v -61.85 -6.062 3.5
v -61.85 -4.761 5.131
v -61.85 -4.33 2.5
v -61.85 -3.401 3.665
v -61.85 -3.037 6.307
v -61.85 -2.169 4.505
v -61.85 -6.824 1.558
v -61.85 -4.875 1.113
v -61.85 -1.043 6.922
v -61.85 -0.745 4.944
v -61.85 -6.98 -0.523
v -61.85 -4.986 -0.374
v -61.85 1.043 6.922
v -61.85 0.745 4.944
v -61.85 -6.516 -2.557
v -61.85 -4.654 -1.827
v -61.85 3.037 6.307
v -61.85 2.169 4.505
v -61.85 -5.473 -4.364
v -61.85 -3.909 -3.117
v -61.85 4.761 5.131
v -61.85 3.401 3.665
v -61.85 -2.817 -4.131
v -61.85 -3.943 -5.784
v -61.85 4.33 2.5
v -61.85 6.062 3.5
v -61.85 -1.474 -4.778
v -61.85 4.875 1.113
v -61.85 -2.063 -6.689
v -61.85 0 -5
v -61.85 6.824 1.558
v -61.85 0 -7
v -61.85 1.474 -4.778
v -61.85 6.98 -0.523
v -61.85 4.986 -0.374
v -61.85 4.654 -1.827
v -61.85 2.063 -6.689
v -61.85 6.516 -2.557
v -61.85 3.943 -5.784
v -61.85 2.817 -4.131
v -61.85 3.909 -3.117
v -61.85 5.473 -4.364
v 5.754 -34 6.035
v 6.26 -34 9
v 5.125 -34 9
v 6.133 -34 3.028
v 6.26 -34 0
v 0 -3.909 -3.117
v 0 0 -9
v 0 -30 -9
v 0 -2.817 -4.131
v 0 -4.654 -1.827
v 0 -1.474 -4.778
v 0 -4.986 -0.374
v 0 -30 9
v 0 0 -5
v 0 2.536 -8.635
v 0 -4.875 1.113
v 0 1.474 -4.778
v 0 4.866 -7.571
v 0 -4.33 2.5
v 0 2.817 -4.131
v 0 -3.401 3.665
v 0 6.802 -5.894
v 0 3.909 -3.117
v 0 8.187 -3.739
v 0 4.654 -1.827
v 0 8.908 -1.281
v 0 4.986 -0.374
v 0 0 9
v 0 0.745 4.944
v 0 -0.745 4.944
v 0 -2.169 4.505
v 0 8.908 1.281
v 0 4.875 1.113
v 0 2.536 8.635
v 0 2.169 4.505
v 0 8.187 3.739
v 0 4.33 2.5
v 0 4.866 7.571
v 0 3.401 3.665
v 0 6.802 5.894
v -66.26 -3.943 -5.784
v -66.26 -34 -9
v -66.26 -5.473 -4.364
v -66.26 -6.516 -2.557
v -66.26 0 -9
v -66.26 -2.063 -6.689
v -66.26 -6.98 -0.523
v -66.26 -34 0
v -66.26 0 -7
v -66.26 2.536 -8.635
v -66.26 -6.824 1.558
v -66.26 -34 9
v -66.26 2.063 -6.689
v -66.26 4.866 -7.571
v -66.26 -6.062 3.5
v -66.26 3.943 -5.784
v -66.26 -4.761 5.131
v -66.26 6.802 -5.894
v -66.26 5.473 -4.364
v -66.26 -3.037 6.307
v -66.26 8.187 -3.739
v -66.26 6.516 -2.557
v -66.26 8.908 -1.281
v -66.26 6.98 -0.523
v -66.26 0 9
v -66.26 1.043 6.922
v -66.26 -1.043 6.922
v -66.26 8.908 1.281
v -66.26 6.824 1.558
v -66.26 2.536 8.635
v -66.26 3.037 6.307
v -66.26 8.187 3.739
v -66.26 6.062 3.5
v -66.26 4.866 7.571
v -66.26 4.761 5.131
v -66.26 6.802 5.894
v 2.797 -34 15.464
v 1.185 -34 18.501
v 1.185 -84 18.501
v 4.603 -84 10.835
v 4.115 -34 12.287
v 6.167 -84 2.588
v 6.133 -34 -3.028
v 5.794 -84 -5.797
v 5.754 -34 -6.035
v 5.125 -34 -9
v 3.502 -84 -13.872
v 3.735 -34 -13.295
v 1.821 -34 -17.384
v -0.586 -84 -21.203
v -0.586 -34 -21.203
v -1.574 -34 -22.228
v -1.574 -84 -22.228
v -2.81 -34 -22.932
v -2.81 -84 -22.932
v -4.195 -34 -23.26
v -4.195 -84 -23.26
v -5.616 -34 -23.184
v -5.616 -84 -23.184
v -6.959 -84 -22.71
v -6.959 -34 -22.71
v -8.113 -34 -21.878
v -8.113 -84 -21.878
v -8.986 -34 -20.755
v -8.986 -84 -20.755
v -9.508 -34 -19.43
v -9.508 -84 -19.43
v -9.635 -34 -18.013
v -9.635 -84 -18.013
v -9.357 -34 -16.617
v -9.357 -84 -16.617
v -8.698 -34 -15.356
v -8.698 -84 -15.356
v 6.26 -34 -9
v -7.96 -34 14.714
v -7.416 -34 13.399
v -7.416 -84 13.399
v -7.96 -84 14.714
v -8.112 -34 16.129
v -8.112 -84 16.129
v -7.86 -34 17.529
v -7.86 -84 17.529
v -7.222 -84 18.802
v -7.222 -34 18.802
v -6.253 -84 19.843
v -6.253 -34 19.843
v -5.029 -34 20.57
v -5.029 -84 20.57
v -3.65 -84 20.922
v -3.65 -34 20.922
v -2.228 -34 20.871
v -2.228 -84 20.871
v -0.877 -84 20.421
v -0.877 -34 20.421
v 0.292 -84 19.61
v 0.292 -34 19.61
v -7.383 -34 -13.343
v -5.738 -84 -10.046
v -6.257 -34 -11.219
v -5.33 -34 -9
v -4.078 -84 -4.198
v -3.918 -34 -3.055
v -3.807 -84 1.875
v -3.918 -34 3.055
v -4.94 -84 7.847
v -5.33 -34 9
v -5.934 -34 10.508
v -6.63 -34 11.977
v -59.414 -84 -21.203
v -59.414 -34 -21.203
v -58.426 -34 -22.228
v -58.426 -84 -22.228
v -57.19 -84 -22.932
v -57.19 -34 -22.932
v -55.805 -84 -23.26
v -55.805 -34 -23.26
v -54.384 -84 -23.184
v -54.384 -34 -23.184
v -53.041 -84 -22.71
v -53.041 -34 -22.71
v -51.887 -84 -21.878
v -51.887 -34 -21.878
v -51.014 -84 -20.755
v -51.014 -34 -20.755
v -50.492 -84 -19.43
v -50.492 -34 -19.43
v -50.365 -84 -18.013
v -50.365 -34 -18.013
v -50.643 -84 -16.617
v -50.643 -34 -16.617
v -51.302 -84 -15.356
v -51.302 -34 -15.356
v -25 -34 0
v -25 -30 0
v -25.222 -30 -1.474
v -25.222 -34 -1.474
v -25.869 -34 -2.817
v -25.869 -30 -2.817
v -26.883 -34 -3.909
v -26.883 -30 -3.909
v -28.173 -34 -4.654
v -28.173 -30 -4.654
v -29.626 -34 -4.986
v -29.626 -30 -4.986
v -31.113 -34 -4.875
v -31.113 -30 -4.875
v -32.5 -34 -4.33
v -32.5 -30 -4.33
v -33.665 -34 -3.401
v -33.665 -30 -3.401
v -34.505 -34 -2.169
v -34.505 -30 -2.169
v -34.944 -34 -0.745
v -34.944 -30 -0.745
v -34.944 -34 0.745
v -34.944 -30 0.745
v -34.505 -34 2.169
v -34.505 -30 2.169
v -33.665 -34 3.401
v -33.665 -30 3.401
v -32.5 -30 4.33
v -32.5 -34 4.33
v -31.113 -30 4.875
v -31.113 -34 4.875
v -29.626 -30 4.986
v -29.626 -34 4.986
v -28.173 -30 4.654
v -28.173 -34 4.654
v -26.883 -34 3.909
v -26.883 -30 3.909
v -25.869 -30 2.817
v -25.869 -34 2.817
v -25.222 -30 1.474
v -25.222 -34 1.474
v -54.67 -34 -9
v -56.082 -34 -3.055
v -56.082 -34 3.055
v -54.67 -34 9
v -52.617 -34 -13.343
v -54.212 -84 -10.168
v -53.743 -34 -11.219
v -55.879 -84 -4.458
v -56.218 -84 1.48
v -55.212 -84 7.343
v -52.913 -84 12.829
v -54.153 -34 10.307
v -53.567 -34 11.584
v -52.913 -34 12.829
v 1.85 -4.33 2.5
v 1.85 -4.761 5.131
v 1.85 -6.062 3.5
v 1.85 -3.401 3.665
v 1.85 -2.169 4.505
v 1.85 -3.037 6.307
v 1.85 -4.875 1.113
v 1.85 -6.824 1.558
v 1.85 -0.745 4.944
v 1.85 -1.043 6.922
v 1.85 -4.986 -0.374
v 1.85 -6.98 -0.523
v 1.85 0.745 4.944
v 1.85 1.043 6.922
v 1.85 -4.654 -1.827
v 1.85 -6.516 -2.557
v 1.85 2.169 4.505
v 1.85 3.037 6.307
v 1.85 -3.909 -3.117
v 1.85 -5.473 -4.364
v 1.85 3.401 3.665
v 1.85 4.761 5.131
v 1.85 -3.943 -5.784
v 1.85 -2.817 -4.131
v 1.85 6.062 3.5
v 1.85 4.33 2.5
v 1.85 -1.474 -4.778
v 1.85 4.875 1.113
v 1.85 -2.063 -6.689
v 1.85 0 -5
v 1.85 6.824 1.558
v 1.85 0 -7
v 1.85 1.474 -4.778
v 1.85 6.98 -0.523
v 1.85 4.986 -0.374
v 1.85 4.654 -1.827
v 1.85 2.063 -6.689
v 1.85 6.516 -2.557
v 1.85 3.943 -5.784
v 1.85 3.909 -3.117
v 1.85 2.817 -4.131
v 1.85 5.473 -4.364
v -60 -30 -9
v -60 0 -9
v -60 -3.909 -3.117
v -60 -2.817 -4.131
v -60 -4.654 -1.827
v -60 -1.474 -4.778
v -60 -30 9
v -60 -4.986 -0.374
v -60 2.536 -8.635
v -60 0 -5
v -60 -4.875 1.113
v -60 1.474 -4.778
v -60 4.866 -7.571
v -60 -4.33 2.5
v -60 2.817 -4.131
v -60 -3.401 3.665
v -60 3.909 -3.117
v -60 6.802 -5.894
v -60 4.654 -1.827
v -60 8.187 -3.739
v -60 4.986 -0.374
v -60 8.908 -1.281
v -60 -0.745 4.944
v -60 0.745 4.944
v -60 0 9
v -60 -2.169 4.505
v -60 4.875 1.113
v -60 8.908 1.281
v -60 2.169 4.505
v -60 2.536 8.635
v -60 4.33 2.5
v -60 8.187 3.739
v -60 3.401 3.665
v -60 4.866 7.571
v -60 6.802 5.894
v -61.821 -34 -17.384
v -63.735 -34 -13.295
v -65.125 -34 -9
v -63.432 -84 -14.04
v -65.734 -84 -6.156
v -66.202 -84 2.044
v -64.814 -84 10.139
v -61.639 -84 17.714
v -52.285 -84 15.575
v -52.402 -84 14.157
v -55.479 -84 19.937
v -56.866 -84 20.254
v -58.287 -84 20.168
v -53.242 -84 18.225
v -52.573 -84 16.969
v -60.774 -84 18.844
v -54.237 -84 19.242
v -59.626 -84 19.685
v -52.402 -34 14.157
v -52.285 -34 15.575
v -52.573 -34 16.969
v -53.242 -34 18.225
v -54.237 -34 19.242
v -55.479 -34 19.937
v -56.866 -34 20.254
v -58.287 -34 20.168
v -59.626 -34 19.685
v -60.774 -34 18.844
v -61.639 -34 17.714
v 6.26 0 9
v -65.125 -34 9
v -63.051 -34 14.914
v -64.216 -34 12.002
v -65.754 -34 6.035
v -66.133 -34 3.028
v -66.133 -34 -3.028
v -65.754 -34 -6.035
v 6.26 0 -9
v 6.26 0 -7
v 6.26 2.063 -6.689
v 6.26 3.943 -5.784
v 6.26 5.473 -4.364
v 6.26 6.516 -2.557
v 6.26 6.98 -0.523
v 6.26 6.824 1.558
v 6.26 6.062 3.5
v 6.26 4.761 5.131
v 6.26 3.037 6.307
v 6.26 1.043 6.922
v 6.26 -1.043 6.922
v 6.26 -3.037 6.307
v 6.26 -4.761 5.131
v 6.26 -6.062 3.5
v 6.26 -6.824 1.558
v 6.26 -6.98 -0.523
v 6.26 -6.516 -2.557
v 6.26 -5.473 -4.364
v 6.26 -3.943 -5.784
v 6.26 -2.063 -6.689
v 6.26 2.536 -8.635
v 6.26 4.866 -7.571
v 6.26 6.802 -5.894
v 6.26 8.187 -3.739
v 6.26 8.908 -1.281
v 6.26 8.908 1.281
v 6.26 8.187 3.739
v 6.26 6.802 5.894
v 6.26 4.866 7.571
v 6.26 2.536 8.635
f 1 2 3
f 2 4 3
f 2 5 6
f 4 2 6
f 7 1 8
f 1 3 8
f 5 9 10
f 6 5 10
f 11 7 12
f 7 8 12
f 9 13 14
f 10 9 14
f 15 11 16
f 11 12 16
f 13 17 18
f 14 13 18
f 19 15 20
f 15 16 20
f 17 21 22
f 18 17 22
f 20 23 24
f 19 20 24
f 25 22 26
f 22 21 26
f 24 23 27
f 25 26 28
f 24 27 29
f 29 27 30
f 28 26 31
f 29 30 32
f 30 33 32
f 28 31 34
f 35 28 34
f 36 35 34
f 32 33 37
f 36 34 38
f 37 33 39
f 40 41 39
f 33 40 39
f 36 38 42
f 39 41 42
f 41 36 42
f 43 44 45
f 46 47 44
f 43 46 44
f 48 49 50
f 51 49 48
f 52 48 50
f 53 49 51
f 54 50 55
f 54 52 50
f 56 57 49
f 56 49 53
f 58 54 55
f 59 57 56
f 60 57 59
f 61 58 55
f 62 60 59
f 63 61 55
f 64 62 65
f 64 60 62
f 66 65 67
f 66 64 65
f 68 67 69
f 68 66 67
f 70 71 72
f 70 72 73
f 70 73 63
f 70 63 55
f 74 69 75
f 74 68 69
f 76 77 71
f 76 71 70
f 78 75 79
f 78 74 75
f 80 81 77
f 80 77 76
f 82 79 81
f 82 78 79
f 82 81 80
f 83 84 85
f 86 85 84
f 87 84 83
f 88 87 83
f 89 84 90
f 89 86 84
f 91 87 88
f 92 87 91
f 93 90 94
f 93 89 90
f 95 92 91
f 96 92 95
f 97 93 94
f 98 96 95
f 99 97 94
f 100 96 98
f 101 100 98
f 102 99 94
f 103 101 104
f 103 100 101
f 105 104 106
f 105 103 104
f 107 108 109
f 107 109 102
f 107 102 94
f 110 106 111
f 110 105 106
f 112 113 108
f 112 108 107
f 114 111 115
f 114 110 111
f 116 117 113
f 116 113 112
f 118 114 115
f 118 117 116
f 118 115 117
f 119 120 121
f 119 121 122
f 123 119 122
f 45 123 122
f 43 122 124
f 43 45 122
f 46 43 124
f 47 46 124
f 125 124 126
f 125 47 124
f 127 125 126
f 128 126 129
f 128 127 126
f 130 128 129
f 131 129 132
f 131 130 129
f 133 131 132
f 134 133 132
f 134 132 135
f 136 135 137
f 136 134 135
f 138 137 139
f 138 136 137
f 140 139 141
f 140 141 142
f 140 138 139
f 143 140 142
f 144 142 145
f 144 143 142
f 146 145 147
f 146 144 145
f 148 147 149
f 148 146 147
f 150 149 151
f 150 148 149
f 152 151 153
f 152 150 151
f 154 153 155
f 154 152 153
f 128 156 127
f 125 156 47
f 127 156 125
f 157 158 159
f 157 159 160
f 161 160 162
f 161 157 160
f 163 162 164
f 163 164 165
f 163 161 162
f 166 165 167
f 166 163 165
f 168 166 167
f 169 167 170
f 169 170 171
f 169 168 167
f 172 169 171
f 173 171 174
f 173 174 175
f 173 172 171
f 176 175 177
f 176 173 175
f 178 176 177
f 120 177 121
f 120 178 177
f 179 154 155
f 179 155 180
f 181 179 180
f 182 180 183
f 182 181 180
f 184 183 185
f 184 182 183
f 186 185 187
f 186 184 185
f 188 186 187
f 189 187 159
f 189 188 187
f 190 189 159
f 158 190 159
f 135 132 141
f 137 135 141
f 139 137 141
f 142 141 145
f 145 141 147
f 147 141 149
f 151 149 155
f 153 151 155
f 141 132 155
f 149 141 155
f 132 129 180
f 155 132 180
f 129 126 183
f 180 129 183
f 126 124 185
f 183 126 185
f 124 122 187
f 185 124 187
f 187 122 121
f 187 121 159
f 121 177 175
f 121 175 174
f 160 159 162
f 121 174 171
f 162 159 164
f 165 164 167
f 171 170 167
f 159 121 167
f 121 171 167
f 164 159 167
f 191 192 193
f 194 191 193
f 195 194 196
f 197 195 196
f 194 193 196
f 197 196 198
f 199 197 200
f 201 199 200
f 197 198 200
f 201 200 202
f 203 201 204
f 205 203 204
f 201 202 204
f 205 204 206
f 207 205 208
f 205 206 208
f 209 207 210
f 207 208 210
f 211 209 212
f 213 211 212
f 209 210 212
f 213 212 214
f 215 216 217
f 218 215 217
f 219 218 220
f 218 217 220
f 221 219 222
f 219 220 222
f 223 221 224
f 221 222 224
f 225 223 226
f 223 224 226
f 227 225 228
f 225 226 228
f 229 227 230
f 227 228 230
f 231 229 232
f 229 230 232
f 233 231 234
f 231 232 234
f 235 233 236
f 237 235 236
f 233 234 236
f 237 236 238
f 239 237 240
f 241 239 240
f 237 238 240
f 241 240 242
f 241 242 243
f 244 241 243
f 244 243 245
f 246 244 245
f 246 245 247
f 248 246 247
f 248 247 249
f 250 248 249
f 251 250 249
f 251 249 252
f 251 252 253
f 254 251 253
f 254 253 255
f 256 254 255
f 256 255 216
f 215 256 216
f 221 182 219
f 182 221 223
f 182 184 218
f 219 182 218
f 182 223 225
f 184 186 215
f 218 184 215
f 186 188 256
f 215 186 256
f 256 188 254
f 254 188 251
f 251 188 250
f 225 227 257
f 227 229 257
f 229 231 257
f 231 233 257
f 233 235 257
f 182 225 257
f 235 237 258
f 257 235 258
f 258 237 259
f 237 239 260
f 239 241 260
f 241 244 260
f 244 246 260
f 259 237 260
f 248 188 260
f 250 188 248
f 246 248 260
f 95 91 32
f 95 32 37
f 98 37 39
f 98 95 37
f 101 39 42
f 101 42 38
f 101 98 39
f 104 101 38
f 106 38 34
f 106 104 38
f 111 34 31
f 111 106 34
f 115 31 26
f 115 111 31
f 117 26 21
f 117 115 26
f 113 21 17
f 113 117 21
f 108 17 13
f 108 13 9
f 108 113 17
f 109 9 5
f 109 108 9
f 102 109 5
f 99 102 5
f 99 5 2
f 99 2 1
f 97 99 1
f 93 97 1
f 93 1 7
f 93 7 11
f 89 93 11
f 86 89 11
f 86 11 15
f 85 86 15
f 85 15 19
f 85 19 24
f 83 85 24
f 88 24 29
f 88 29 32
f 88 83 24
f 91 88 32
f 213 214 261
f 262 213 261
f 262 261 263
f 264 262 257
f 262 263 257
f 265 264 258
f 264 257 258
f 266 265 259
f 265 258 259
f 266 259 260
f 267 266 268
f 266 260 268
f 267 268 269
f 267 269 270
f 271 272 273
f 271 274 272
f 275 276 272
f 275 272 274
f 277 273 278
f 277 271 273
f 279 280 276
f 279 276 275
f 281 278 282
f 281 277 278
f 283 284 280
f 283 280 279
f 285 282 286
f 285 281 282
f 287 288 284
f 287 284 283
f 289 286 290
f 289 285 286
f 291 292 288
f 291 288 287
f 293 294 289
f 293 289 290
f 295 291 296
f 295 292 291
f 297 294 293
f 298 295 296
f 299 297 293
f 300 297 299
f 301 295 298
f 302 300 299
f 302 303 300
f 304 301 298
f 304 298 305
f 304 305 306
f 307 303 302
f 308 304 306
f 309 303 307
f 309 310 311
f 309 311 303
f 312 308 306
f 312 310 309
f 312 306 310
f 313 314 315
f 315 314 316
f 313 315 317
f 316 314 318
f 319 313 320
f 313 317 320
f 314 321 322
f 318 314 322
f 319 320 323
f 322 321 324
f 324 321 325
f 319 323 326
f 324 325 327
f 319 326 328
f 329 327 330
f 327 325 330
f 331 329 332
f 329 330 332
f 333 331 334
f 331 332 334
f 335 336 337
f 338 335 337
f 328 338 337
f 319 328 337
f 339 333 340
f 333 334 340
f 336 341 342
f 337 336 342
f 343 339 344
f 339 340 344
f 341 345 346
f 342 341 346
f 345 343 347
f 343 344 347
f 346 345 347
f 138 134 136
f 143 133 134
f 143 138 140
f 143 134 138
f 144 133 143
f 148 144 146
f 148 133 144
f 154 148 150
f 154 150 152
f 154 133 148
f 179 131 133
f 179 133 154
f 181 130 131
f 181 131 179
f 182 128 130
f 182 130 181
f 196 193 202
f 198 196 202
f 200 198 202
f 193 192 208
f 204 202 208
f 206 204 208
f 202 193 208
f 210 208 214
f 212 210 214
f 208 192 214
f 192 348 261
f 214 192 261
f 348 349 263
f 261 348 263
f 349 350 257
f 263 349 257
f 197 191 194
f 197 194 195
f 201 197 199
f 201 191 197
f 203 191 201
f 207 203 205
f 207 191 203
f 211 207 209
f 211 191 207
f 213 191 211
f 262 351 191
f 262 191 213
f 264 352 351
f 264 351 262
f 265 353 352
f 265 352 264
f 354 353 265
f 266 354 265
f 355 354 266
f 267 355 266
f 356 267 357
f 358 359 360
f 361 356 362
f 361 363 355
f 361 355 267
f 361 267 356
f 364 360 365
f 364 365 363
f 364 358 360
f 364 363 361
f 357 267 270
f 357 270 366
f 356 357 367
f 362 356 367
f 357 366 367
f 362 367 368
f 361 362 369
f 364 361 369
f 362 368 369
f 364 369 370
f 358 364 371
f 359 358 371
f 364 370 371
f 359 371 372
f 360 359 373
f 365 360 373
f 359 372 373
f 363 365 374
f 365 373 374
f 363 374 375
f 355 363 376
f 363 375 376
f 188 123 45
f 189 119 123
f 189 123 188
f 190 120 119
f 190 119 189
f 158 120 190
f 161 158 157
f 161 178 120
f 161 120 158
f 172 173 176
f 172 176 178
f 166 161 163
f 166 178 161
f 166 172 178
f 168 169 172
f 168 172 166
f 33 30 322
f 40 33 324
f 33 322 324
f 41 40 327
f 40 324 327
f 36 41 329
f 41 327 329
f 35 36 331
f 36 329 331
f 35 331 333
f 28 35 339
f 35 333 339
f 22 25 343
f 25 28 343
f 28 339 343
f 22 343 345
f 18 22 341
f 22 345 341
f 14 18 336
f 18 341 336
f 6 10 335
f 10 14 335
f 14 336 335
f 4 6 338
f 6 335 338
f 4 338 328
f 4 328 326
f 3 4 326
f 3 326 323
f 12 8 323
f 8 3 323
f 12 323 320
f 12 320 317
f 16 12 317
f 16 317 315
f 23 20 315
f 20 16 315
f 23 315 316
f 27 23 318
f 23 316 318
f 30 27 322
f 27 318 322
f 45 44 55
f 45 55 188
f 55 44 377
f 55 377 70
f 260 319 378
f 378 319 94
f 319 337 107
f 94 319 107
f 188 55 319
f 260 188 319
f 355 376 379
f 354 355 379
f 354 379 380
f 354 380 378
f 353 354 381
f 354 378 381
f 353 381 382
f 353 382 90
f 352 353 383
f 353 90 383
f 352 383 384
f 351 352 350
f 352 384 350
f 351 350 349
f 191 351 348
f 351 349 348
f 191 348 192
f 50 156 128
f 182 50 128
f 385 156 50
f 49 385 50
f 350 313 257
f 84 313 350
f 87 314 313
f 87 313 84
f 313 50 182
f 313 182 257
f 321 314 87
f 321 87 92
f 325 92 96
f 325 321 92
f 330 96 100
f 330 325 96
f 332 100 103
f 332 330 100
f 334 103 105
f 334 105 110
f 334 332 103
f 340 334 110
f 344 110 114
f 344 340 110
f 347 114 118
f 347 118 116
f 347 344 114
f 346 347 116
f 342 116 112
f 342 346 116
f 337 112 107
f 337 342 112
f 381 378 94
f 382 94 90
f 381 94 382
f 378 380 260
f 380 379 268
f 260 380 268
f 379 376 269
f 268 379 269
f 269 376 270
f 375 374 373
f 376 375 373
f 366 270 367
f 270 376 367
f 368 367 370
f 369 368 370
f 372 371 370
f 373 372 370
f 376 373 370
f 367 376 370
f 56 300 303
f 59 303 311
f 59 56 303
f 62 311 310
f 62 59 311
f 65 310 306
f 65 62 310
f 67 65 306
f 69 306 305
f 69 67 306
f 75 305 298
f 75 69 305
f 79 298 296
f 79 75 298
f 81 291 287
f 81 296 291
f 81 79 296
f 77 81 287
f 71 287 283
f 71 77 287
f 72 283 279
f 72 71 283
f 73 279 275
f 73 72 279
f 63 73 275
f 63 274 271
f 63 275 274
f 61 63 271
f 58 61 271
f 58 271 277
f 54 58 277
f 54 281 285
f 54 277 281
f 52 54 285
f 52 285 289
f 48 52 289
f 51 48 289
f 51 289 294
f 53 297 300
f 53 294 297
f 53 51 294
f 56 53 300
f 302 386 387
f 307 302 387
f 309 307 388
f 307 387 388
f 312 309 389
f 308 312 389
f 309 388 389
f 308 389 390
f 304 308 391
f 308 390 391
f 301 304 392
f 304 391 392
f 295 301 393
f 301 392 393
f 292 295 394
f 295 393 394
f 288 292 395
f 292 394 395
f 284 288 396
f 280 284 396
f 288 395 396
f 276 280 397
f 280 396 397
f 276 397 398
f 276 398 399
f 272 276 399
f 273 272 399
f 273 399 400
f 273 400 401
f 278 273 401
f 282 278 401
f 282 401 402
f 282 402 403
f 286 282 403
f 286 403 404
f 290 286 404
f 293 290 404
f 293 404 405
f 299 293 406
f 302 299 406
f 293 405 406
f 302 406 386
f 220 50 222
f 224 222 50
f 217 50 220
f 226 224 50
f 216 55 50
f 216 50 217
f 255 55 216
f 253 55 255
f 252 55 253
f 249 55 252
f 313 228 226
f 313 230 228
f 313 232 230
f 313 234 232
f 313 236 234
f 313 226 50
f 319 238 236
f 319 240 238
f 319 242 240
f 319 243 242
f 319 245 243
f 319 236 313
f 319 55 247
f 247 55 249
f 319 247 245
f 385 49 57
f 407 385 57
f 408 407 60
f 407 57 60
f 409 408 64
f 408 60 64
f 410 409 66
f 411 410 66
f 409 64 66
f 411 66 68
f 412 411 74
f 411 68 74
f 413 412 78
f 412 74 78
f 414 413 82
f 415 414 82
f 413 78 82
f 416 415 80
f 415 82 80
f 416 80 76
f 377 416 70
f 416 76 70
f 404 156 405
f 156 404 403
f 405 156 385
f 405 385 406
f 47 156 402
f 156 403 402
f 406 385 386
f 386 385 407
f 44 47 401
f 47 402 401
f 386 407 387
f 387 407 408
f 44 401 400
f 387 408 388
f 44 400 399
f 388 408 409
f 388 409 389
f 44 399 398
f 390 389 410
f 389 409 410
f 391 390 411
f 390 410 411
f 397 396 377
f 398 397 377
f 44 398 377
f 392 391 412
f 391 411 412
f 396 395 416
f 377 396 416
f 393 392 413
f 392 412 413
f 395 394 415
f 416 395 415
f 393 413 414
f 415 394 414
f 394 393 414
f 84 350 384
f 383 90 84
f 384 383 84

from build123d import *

# Parameters (mm, degrees)
SKETCH1_R           = 9
SKETCH1_R_2         = 5
BOSS_EXTRUDE1_DEPTH = 6.26
BOSS_EXTRUDE2_DEPTH = 6.26
SKETCH2_R           = 7
CUT_EXTRUDE1_DEPTH  = 4.41
SKETCH4_W           = 36.26
SKETCH4_H           = 18
BOSS_EXTRUDE3_DEPTH = 4
SKETCH5_R           = 5
CUT_EXTRUDE2_DEPTH  = 5
BOSS_EXTRUDE4_DEPTH = 50


with BuildPart() as part:
    # Sketch1 → Boss-Extrude1 (new body)
    with BuildSketch(Plane(origin=(0, 0, 0), x_dir=(0, 0, -1), z_dir=(1, 0, 0))):
        Circle(SKETCH1_R)
        Circle(SKETCH1_R_2, mode=Mode.SUBTRACT)
    extrude(amount=BOSS_EXTRUDE1_DEPTH)

    # Sketch3 → Boss-Extrude2 (add)
    with BuildSketch(Plane.ZY):
        with BuildLine():
            Line((-9, 0), (-9, -30))
            Line((-9, -30), (9, -30))
            Line((9, -30), (9, 0))
            Line((9, 0), (5, 0))
            ThreePointArc((5, 0), (0, -5), (-5, 0))
            Line((-5, 0), (-9, 0))
        make_face()
    extrude(amount=-BOSS_EXTRUDE2_DEPTH)

    # Sketch2 → Cut-Extrude1 (cut)
    with BuildSketch(Plane(origin=(6.26, 0, 0), x_dir=(0, 0, -1), z_dir=(1, 0, 0))):
        Circle(SKETCH2_R)
    extrude(amount=-CUT_EXTRUDE1_DEPTH, mode=Mode.SUBTRACT)

    # Sketch4 → Boss-Extrude3 (add)
    with BuildSketch(Plane.XZ.offset(30)):
        with Locations((-11.87, 0)):
            Rectangle(SKETCH4_W, SKETCH4_H)
    extrude(amount=BOSS_EXTRUDE3_DEPTH)

    # Mirror2: part across plane


with BuildPart() as part_1:
    add(part.part)
    add(part.part.mirror(Plane(origin=(-30, -34, 9), x_dir=(0, 0, 1), z_dir=(1, 0, 0))))

    # Sketch5 → Cut-Extrude2 (cut, through all)
    with BuildSketch(Plane(origin=(0, -30, 0), x_dir=(1, 0, 0), z_dir=(0, 1, 0))):
        with Locations((-30, 0)):
            Circle(SKETCH5_R)
    extrude(amount=-CUT_EXTRUDE2_DEPTH, mode=Mode.SUBTRACT)

    # Sketch6 → Boss-Extrude4 (add)
    with BuildSketch(Plane.XZ.offset(34)):
        with BuildLine():
            ThreePointArc((1.184711928, 18.501387568), (6.224007517, -1.615202581), (-0.585698563, -21.203454222))
            ThreePointArc((-0.585698563, -21.203454222), (-7.565532493, -22.335672537), (-8.697750807, -15.355838607))
            ThreePointArc((-8.697750807, -15.355838607), (-3.76606626, -1.169752338), (-7.415594726, 13.39896408))
            ThreePointArc((-7.415594726, 13.39896408), (-5.666653143, 20.250329151), (1.184711928, 18.501387568))
        make_face()
        with BuildLine():
            ThreePointArc((-61.638666525, 17.713903593), (-66.200917241, -2.069103891), (-59.414301437, -21.203454222))
            ThreePointArc((-59.414301437, -21.203454222), (-52.434467507, -22.335672537), (-51.302249193, -15.355838607))
            ThreePointArc((-51.302249193, -15.355838607), (-56.217211438, -1.498474026), (-52.913165553, 12.828657153))
            ThreePointArc((-52.913165553, 12.828657153), (-54.833292819, 19.634030859), (-61.638666525, 17.713903593))
        make_face()
    extrude(amount=BOSS_EXTRUDE4_DEPTH)


solid = part_1.part
